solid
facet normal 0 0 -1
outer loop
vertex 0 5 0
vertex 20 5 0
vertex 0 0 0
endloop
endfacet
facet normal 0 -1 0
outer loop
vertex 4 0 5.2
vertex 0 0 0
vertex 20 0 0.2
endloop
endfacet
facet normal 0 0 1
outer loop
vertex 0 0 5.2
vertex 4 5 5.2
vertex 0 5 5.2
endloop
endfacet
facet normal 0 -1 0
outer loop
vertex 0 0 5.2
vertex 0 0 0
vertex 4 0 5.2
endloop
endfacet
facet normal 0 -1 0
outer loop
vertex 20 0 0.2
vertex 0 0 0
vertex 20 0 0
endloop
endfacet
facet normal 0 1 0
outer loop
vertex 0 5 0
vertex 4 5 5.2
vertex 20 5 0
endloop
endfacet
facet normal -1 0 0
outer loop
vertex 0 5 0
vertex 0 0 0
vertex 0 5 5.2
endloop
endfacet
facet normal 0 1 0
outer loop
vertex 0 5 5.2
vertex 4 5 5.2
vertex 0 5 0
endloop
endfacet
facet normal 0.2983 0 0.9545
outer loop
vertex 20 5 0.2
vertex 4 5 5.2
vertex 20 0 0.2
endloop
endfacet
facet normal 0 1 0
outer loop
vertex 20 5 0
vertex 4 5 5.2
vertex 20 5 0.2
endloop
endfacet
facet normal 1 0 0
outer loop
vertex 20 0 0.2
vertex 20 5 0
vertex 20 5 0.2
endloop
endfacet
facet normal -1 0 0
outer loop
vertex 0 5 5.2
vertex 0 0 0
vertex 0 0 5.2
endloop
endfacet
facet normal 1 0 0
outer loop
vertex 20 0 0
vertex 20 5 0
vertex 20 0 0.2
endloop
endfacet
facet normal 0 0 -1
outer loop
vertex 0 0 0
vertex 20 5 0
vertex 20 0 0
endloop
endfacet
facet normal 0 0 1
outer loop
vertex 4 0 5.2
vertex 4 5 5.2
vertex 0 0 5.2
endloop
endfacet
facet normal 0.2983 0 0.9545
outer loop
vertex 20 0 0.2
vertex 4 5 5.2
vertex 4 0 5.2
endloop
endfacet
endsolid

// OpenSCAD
hull(){
  cube([20, 5, 0.2]);
  translate([0, 0, 5]) cube([4, 5, 0.2]);
}
